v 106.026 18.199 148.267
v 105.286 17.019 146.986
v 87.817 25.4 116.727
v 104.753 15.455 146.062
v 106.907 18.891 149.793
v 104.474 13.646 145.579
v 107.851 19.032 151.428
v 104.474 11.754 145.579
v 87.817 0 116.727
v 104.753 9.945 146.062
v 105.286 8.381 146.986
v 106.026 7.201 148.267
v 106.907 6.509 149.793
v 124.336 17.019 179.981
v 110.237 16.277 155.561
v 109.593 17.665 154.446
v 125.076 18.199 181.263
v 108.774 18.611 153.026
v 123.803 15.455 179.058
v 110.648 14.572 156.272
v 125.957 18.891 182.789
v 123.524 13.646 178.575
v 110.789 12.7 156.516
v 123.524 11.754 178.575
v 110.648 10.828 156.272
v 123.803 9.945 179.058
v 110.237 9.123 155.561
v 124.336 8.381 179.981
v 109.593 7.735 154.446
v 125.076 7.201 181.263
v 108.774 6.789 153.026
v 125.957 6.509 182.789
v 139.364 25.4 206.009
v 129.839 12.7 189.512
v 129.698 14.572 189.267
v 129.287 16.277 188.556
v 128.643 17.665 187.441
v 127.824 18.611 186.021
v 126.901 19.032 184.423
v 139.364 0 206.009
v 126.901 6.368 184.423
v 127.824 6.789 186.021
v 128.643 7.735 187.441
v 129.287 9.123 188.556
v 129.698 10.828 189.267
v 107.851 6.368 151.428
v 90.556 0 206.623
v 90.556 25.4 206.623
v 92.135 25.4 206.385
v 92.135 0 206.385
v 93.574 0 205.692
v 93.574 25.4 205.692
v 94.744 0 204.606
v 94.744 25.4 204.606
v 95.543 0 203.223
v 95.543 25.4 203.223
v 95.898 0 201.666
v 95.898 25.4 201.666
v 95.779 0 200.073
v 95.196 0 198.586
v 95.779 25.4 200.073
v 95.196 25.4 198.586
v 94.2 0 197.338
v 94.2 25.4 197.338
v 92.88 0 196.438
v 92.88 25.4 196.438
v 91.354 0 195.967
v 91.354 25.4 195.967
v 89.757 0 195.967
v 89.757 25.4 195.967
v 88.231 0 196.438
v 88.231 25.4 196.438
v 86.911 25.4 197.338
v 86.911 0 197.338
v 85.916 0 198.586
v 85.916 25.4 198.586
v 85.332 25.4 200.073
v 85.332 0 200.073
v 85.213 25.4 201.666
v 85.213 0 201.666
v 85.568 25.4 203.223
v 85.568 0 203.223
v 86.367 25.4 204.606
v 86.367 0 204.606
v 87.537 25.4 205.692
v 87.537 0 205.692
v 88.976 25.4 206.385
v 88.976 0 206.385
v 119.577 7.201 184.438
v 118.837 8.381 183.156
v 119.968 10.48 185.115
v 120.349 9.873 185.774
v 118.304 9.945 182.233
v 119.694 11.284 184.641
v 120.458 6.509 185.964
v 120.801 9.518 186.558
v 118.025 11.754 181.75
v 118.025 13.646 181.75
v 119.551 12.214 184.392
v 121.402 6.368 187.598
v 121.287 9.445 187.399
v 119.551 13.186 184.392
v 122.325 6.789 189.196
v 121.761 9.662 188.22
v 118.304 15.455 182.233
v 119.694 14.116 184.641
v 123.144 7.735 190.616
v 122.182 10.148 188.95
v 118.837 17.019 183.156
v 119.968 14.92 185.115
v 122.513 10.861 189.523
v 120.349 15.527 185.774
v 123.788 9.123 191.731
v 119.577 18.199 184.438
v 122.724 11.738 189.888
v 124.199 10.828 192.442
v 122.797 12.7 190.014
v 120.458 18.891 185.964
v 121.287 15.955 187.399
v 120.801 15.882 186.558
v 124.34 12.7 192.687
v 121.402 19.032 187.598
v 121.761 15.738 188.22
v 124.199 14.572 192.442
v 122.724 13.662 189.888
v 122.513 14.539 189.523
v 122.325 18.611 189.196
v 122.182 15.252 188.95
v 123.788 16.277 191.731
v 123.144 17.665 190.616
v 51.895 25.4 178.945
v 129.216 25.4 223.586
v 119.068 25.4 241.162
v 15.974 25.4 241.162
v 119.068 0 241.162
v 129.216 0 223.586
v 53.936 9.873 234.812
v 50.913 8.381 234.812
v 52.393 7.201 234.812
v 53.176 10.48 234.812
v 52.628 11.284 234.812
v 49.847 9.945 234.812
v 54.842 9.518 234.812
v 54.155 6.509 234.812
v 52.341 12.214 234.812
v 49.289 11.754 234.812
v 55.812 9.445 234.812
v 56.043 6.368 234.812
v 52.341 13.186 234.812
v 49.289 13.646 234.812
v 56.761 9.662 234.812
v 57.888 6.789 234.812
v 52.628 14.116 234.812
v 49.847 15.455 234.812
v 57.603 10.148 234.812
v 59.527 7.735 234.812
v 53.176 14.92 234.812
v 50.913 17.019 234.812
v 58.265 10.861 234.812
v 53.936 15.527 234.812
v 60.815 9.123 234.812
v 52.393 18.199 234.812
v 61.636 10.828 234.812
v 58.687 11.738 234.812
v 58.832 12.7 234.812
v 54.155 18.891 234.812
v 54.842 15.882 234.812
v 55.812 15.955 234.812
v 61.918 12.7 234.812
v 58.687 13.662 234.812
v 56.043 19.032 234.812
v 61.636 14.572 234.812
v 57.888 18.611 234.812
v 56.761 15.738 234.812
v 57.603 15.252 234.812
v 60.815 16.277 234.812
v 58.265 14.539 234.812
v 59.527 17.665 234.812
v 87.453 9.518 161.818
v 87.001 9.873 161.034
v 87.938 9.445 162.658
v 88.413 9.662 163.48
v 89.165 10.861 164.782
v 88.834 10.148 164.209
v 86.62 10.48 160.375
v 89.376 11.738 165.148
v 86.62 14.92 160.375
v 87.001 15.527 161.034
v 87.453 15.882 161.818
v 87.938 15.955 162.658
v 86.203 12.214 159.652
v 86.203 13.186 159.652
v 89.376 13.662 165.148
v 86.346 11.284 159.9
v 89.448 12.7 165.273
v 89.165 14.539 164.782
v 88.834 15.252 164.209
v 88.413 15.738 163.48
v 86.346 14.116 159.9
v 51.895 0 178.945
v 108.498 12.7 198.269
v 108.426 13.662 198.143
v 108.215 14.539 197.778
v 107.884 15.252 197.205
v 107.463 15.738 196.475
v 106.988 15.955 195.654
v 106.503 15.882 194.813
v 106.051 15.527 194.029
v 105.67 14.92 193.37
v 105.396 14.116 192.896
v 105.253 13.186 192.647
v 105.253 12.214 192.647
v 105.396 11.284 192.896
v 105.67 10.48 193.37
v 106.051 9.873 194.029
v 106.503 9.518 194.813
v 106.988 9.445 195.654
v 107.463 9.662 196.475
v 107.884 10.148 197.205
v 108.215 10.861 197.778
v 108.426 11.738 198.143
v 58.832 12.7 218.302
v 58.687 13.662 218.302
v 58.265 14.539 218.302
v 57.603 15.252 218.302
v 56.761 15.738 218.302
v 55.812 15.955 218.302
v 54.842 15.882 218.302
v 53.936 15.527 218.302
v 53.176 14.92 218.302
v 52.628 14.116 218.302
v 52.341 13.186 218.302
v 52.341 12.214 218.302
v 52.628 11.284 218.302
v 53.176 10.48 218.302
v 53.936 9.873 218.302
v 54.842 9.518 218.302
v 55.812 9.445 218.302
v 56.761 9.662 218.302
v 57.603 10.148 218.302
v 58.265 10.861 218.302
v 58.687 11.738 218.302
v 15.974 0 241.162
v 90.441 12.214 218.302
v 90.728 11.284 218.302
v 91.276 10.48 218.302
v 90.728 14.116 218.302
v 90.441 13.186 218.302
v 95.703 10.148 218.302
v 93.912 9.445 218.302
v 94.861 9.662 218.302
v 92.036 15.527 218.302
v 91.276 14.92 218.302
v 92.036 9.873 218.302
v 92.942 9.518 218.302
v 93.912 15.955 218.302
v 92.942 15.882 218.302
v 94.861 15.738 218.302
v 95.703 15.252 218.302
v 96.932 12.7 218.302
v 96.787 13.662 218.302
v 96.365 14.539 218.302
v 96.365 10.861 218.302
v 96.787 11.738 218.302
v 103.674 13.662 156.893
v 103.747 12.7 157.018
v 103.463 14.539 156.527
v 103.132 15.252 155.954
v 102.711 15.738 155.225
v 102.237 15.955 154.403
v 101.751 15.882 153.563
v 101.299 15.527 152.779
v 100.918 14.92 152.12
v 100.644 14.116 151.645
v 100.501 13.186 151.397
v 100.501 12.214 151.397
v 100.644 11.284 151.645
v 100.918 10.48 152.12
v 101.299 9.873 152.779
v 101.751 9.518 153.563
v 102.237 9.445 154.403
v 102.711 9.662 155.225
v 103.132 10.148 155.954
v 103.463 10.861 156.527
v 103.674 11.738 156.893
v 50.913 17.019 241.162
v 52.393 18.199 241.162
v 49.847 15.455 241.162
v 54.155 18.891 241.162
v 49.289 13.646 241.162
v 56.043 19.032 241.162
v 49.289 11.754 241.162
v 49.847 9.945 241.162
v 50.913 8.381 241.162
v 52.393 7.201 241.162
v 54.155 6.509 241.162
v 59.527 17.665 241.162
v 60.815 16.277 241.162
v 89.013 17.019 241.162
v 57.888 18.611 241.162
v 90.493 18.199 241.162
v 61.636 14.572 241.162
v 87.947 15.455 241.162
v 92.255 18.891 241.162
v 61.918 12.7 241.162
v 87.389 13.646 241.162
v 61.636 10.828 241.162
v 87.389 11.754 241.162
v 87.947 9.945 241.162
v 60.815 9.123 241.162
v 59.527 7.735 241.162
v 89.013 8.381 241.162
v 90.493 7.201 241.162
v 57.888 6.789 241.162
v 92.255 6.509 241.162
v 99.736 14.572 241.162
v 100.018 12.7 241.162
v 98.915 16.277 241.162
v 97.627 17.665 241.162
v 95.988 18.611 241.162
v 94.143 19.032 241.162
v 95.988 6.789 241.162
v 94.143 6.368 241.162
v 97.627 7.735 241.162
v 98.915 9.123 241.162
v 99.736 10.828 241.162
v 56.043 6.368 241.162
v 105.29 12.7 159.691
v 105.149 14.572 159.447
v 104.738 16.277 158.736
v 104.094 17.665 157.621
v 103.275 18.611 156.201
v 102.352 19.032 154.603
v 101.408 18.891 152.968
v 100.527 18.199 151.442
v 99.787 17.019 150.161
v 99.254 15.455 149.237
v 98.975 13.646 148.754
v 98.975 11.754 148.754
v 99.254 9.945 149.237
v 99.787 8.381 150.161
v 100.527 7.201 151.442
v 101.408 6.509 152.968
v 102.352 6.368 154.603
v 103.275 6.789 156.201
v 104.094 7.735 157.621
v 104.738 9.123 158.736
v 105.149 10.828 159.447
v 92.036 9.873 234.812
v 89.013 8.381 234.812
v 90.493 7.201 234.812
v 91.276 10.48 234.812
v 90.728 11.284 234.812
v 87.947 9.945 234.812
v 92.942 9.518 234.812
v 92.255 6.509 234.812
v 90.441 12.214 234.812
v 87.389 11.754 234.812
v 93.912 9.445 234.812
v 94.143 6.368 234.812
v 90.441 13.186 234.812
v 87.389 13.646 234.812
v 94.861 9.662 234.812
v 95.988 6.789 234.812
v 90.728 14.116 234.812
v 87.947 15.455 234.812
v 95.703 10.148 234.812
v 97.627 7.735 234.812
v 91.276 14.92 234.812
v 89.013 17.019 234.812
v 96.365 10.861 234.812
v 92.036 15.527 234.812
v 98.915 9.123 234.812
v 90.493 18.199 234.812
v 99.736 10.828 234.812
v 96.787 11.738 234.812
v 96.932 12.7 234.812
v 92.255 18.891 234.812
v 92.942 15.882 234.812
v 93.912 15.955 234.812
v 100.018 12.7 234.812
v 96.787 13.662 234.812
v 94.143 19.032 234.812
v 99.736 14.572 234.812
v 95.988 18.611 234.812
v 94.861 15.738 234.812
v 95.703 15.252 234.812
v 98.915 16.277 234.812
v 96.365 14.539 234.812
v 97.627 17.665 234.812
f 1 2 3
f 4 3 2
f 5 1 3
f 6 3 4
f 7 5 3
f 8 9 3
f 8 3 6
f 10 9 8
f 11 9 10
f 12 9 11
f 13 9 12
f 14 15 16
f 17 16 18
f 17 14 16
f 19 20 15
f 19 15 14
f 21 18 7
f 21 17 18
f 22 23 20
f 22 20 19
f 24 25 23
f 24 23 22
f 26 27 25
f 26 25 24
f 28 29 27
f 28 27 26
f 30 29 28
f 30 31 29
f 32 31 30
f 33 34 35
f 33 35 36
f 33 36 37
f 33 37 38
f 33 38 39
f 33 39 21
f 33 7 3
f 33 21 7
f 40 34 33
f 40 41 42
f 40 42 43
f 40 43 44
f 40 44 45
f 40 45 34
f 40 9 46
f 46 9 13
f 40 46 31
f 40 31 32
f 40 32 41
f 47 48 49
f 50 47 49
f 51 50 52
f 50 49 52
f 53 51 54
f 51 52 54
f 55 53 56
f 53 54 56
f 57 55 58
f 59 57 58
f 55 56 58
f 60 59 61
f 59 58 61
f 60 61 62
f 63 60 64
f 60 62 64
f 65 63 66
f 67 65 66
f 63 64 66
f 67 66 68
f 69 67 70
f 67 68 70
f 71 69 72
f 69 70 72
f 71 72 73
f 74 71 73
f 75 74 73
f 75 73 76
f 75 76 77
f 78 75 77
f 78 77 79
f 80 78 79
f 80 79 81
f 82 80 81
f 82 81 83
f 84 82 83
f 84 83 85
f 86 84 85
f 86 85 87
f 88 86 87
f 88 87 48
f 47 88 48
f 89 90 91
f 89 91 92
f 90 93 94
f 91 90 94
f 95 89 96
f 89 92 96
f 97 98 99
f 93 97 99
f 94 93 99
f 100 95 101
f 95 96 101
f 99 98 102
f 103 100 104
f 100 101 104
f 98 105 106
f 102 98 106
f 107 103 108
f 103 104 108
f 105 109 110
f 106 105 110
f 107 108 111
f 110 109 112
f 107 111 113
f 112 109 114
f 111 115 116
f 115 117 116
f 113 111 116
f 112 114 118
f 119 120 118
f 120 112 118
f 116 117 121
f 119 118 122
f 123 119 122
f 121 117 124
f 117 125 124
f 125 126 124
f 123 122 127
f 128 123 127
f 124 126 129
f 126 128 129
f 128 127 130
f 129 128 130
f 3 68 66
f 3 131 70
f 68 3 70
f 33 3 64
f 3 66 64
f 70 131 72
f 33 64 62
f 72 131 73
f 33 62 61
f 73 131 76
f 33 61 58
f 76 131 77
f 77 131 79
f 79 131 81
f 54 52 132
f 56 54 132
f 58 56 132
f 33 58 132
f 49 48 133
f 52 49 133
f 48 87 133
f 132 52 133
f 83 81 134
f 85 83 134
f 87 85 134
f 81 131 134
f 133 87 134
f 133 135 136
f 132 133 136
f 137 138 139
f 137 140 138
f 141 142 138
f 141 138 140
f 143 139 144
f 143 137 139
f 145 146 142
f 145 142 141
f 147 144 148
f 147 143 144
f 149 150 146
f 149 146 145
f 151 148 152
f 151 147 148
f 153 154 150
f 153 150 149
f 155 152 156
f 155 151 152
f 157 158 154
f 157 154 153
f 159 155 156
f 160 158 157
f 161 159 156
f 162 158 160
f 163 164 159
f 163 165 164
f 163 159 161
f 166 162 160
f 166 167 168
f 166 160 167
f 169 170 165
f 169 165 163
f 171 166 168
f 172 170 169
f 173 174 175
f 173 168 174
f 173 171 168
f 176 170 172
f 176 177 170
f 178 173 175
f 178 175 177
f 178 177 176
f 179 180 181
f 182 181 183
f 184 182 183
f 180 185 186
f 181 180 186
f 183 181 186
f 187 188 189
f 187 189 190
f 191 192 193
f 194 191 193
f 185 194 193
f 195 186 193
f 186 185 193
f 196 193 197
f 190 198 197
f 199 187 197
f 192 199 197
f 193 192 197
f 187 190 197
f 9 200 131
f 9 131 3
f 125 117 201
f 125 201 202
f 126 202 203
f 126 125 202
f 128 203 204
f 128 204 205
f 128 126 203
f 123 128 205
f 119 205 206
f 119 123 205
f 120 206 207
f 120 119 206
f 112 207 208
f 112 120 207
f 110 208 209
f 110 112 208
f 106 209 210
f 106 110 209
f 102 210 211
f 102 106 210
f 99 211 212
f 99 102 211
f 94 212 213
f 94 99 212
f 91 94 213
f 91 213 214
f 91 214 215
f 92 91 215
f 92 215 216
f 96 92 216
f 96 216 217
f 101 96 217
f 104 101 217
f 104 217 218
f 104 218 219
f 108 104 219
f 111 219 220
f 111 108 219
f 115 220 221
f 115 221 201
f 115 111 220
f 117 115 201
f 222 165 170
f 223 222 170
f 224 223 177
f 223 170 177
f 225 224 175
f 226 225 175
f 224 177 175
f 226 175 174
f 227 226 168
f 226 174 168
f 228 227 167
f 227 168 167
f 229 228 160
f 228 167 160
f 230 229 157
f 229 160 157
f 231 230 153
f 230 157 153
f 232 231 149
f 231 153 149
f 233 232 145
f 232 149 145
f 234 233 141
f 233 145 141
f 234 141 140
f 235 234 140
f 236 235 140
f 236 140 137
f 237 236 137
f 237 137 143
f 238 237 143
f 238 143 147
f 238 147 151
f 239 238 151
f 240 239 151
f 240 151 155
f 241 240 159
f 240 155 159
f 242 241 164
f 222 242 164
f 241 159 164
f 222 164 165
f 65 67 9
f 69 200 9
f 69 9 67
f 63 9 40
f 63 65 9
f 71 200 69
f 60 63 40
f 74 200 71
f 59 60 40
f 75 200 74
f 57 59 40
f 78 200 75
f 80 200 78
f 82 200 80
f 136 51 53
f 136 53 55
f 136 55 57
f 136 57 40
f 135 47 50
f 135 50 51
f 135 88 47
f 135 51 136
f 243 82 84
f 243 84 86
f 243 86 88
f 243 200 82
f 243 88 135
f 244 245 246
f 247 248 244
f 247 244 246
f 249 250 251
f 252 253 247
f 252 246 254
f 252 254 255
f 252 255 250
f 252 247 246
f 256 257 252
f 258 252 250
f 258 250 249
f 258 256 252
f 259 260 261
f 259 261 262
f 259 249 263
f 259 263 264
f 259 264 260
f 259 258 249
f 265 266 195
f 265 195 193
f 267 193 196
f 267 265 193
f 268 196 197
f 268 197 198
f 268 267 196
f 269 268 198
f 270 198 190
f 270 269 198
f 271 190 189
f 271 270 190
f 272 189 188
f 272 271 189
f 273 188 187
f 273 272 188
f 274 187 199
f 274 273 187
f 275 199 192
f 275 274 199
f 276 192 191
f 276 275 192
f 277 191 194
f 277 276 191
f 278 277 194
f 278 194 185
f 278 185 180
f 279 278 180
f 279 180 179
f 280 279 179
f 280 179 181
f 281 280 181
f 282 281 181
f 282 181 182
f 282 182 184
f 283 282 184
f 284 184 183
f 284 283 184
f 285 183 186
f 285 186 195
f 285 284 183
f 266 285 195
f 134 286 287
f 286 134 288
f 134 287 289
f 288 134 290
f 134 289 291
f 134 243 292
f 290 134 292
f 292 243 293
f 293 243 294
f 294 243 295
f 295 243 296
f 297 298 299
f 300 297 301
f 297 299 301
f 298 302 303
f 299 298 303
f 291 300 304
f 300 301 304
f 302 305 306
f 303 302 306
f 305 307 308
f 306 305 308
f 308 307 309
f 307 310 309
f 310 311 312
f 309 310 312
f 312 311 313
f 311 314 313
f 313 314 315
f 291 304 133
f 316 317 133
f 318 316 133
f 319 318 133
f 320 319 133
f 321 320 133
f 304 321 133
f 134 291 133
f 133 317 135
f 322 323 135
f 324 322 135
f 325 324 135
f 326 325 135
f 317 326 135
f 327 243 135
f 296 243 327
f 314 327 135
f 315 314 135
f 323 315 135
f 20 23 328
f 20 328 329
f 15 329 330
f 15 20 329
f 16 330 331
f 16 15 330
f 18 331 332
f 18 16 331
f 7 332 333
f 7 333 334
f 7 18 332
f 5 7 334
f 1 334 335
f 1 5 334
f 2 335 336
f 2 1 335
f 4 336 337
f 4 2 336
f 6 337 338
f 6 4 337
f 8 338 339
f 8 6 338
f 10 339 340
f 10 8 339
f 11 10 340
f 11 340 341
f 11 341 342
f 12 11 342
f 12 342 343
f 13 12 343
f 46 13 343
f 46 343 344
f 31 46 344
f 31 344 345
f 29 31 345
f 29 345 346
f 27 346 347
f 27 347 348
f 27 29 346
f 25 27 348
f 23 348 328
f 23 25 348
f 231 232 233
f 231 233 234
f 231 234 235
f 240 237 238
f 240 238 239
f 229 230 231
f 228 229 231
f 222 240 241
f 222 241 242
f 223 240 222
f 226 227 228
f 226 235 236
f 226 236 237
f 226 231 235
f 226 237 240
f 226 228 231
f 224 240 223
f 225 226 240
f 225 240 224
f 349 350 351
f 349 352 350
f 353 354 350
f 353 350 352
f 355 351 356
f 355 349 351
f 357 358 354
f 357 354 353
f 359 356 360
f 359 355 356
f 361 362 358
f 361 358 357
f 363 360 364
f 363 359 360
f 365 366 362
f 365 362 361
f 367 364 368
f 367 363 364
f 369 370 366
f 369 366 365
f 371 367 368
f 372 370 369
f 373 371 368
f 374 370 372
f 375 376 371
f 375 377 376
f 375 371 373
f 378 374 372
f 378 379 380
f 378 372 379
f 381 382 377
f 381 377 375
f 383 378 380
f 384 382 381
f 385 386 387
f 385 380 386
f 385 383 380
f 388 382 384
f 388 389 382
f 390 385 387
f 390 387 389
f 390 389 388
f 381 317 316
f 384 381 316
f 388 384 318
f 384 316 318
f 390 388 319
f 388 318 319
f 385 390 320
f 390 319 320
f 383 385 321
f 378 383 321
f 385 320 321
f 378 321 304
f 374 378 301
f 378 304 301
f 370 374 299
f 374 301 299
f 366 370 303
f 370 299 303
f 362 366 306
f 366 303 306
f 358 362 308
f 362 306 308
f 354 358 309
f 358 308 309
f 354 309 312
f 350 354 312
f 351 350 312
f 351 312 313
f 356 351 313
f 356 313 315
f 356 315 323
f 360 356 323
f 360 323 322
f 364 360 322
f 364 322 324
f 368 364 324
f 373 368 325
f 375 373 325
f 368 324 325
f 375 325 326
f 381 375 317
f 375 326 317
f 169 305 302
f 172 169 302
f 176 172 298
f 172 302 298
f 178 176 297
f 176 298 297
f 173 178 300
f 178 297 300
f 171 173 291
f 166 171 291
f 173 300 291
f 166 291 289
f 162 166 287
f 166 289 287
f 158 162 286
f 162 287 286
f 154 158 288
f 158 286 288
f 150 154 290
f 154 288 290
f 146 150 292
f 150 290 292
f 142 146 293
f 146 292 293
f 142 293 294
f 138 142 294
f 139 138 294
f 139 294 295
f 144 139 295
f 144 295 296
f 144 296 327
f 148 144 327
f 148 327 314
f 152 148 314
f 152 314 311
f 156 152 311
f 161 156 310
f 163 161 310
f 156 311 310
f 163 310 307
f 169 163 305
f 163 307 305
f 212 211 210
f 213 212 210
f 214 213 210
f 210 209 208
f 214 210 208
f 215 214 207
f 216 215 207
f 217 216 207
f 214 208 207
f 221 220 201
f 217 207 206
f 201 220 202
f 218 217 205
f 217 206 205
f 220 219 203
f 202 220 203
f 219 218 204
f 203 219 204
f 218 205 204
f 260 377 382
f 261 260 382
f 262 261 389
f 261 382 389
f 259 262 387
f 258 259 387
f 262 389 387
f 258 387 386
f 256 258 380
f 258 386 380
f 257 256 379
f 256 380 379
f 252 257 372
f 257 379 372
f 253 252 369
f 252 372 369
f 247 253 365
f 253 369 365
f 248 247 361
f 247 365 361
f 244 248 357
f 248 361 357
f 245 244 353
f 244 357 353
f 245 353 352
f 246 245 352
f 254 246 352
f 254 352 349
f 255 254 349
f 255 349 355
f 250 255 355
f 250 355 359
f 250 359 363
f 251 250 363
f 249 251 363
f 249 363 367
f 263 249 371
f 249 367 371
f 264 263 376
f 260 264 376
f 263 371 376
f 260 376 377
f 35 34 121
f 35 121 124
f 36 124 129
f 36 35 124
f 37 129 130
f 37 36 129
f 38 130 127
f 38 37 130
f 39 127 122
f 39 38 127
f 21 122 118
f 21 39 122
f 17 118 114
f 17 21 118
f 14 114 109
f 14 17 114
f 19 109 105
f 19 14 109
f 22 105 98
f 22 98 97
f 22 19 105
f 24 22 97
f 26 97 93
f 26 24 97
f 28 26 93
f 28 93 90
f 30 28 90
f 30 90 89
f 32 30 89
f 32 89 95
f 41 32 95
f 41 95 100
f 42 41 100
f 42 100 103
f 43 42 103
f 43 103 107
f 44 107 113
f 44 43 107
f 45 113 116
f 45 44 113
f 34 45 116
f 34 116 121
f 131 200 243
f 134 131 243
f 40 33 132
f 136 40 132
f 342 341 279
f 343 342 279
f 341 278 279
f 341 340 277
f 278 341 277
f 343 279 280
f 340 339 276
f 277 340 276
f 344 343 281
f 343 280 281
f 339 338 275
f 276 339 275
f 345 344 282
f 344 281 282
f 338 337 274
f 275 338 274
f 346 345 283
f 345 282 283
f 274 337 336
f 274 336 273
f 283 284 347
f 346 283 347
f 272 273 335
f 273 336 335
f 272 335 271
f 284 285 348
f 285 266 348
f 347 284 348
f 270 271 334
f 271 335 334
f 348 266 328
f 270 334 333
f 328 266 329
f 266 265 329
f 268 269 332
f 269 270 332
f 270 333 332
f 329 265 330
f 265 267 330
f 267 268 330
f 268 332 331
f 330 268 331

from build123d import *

# Parameters (mm, degrees)
BOSS_EXTRUDE1_DEPTH = 25.4
SKETCH2_R           = 6.35
CUT_EXTRUDE1_DEPTH  = 6.35
SKETCH3_R           = 3.2639
CUT_EXTRUDE2_DEPTH  = 16.51
SKETCH4_R           = 3.2639
CUT_EXTRUDE3_DEPTH  = 16.51
SKETCH5_R           = 5.3578125
CUT_EXTRUDE4_DEPTH  = 280.690442894


with BuildPart() as part:
    # Sketch1 → Boss-Extrude1 (new body)
    with BuildSketch(Plane(origin=(0, 0, 0), x_dir=(1, 0, 0), z_dir=(0, 1, 0))):
        Polygon((119.068292428, -241.162389864), (129.21607637, -223.585912492), (51.895065274, -178.944605922), (15.973610966, -241.162389864), align=None)
    boss_extrude1 = extrude(amount=BOSS_EXTRUDE1_DEPTH)

    # Sketch2 → Cut-Extrude1 (cut)
    with BuildSketch(Plane.XY.offset(241.162389864)):
        with Locations((55.568292428, 12.7)):
            Circle(SKETCH2_R)
        with Locations((93.668292428, 12.7)):
            Circle(SKETCH2_R)
    cut_extrude1 = extrude(amount=-CUT_EXTRUDE1_DEPTH, mode=Mode.SUBTRACT)

    # Sketch3 → Cut-Extrude2 (cut)
    with BuildSketch(Plane.XY.offset(234.812389864)):
        with Locations((55.568292428, 12.7)):
            Circle(SKETCH3_R)
    cut_extrude2 = extrude(amount=-CUT_EXTRUDE2_DEPTH, mode=Mode.SUBTRACT)

    # Sketch4 → Cut-Extrude3 (cut)
    with BuildSketch(Plane.XY.offset(234.812389864)):
        with Locations((93.668292428, 12.7)):
            Circle(SKETCH4_R)
    cut_extrude3 = extrude(amount=-CUT_EXTRUDE3_DEPTH, mode=Mode.SUBTRACT)

    # Mirror1: Boss-Extrude1, Cut-Extrude1, Cut-Extrude2, Cut-Extrude3 across plane
    add(boss_extrude1.mirror(Plane(origin=(51.895065274, 25.4, 178.944605922), x_dir=(0.8660254037844389, 0, 0.4999999999999996), z_dir=(-0.49999999999999983, 0, 0.8660254037844388))))
    add(cut_extrude1.mirror(Plane(origin=(51.895065274, 25.4, 178.944605922), x_dir=(0.8660254037844389, 0, 0.4999999999999996), z_dir=(-0.49999999999999983, 0, 0.8660254037844388))), mode=Mode.SUBTRACT)
    add(cut_extrude2.mirror(Plane(origin=(51.895065274, 25.4, 178.944605922), x_dir=(0.8660254037844389, 0, 0.4999999999999996), z_dir=(-0.49999999999999983, 0, 0.8660254037844388))), mode=Mode.SUBTRACT)
    add(cut_extrude3.mirror(Plane(origin=(51.895065274, 25.4, 178.944605922), x_dir=(0.8660254037844389, 0, 0.4999999999999996), z_dir=(-0.49999999999999983, 0, 0.8660254037844388))), mode=Mode.SUBTRACT)

    # Sketch5 → Cut-Extrude4 (cut, through all)
    with BuildSketch(Plane(origin=(0, 25.4, 0), x_dir=(1, 0, 0), z_dir=(0, 1, 0))):
        with Locations(Location((90.555570822, -201.265259207, 0), (0, 0, 270))):
            Circle(SKETCH5_R)
    extrude(amount=-CUT_EXTRUDE4_DEPTH, mode=Mode.SUBTRACT)


solid = part.part
